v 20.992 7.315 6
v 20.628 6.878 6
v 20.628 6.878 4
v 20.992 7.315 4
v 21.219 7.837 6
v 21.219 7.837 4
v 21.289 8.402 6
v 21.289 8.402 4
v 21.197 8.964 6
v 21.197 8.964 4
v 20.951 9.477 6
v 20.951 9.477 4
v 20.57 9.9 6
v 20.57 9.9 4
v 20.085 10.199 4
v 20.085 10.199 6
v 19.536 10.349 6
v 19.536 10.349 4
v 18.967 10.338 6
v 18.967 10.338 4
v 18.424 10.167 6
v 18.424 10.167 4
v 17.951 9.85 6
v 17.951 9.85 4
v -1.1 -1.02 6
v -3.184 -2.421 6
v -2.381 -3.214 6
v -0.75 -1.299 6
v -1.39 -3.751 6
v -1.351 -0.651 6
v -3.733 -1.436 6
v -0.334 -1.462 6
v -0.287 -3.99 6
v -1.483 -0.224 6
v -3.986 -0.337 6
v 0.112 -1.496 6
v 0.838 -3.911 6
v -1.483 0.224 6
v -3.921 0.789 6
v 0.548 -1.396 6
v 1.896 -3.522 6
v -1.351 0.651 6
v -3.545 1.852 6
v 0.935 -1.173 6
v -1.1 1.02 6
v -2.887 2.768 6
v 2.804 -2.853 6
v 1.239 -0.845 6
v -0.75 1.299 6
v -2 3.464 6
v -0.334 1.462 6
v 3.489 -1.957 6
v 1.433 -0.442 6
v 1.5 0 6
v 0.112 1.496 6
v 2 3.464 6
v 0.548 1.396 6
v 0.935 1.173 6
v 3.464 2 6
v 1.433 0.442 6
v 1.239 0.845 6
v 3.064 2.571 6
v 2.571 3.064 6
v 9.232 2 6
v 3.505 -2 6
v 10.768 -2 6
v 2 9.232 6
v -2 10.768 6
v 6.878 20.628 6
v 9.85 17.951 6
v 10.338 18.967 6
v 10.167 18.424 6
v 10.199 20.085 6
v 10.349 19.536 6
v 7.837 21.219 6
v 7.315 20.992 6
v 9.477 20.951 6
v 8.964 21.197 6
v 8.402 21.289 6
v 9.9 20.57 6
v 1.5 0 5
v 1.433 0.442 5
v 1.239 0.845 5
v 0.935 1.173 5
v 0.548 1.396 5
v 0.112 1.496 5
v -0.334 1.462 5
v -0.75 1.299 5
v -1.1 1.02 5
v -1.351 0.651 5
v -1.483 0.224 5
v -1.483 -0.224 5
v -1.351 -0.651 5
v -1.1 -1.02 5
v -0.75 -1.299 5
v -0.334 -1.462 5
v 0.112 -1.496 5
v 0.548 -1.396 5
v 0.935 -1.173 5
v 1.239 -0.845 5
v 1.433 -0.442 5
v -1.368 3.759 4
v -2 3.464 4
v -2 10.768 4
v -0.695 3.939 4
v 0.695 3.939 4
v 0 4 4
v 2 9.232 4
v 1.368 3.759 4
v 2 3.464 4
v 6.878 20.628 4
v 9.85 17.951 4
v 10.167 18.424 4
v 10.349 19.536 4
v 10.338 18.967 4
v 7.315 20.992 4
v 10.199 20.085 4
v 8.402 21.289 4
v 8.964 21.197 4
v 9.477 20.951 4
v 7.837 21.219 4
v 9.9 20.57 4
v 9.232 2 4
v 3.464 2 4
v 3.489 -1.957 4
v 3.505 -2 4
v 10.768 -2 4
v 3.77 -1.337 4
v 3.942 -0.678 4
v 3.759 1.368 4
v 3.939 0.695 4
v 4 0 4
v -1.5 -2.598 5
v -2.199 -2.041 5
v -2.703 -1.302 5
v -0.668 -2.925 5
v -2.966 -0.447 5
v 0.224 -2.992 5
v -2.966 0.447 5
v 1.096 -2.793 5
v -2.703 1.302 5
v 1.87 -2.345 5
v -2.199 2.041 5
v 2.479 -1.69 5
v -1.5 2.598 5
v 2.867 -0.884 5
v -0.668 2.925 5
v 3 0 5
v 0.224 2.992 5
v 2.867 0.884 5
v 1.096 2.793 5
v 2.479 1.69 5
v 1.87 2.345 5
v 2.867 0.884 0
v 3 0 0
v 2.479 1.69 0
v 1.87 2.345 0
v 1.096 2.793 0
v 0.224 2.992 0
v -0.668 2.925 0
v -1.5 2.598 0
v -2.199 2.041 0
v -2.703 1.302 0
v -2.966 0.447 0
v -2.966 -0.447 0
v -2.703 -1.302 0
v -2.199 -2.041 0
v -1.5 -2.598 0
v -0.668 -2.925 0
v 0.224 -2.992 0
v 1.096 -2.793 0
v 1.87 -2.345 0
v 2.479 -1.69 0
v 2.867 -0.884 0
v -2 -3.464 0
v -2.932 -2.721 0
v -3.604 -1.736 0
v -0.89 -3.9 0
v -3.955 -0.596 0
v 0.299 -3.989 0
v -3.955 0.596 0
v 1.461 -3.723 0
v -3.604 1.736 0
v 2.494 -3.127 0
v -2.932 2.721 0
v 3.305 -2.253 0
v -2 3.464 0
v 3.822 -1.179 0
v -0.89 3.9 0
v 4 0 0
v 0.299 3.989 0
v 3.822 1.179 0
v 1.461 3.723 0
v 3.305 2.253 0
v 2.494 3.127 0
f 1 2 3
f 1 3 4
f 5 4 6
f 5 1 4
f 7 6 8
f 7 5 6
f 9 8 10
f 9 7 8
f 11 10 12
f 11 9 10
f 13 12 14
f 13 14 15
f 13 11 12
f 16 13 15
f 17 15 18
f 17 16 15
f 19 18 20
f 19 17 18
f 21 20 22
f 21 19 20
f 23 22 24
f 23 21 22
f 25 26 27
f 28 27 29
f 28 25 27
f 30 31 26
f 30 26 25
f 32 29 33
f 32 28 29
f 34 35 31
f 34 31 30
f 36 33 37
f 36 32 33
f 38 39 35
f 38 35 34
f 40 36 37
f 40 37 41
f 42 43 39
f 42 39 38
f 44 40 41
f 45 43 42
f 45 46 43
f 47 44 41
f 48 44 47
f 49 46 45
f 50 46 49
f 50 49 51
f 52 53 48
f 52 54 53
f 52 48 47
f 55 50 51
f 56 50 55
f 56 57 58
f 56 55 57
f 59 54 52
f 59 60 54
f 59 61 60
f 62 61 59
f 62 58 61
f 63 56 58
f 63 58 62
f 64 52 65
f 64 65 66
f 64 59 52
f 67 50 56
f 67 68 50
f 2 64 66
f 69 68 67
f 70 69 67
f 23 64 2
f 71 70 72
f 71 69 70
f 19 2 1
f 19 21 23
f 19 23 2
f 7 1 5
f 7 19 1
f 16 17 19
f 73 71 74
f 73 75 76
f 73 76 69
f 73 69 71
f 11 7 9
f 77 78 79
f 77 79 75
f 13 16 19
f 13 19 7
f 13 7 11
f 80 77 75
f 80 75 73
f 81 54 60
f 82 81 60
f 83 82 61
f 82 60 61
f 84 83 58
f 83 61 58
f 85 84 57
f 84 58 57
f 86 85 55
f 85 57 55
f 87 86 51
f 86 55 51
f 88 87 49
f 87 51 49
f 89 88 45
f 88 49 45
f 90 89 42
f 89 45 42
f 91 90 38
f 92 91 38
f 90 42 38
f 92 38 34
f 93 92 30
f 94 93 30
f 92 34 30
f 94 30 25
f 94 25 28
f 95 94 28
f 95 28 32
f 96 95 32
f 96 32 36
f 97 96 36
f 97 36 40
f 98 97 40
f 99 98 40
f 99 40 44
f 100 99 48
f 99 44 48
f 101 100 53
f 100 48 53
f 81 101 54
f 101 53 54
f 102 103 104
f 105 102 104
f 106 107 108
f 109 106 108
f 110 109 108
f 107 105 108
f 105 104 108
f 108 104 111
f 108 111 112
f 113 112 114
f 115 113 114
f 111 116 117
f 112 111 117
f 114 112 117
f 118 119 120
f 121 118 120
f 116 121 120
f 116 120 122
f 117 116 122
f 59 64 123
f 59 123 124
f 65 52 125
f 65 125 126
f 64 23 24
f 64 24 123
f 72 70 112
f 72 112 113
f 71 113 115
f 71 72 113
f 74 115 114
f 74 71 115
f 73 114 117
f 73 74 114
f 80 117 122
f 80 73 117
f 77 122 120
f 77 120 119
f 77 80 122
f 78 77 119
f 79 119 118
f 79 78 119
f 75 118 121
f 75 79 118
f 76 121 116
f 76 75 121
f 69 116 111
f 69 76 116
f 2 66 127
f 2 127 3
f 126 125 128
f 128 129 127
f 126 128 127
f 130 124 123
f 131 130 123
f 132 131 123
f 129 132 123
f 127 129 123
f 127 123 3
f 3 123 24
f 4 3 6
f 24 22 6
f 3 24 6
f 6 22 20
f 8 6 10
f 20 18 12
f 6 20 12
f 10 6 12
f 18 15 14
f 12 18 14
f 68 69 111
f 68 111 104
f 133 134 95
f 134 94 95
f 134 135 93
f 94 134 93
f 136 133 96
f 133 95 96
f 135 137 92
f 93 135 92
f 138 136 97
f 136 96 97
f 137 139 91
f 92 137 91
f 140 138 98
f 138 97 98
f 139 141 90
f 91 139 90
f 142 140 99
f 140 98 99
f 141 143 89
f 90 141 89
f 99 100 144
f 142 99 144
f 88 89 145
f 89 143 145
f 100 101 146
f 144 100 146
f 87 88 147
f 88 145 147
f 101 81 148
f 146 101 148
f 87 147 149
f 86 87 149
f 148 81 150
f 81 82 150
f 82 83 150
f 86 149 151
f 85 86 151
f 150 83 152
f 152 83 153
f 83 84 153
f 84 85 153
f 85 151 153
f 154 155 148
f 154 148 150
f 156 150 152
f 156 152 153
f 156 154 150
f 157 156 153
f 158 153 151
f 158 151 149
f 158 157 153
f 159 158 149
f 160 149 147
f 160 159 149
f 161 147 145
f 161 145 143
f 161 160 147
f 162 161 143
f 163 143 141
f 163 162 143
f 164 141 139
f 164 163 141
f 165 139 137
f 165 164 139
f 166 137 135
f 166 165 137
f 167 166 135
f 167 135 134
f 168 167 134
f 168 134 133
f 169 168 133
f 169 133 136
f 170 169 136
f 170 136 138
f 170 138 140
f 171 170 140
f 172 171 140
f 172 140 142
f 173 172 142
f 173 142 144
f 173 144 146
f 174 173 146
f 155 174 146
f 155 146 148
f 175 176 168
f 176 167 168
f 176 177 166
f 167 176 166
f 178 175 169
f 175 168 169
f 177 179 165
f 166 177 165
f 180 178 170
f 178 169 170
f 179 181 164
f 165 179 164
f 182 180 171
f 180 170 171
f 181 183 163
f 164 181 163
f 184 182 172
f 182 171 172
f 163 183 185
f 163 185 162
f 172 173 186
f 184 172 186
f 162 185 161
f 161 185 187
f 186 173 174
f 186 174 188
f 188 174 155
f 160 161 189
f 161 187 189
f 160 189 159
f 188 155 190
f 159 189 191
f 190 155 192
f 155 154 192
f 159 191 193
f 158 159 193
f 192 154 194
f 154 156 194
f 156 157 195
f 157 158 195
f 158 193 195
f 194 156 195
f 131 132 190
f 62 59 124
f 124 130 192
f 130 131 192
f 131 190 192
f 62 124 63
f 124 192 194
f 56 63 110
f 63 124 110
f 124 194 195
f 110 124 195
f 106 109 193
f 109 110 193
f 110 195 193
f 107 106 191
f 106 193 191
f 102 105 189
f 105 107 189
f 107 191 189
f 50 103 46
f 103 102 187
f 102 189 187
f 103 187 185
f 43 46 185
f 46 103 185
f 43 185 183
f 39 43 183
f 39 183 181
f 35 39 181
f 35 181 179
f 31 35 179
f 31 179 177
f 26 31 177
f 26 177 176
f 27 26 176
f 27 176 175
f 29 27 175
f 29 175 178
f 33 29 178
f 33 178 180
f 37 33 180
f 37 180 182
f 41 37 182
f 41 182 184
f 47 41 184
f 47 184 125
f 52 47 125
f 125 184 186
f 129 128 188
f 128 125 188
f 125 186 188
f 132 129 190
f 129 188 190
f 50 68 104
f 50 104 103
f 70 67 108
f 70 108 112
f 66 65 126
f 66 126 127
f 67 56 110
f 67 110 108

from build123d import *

# Parameters (mm, degrees)
ESQUISSE4_R        = 4
ESQUISSE4_R_2      = 3
BOSS_EXTRU_1_DEPTH = 6
ESQUISSE6_R        = 3
ESQUISSE6_R_2      = 1.5
BOSS_EXTRU_2_DEPTH = 1
BOSS_EXTRU_3_DEPTH = 2


with BuildPart() as part:
    # Esquisse4 → Boss.-Extru.1 (new body)
    with BuildSketch(Plane.XY):
        Circle(ESQUISSE4_R)
        Circle(ESQUISSE4_R_2, mode=Mode.SUBTRACT)
    extrude(amount=BOSS_EXTRU_1_DEPTH)

    # Esquisse6 → Boss.-Extru.2 (add)
    with BuildSketch(Plane.XY.offset(6)):
        Circle(ESQUISSE6_R)
        Circle(ESQUISSE6_R_2, mode=Mode.SUBTRACT)
    extrude(amount=-BOSS_EXTRU_2_DEPTH)

    # Esquisse7 → Boss.-Extru.3 (add)
    with BuildSketch(Plane.XY.offset(6)):
        with BuildLine():
            ThreePointArc((3.464101615, 2), (3.863703305, 1.03527618), (4, 0))
            ThreePointArc((4, 0), (3.870082468, -1.011168479), (3.488769153, -1.956652702))
            Line((3.488769153, -1.956652702), (3.505079435, -2))
            Line((3.505079435, -2), (10.76772807, -2))
            Line((10.76772807, -2), (20.627571531, 6.877842929))
            ThreePointArc((20.627571531, 6.877842929), (20.775599969, 9.702393792), (17.951049106, 9.85042223))
            Line((17.951049106, 9.85042223), (9.23227193, 2))
            Line((9.23227193, 2), (3.464101615, 2))
        make_face()
        with BuildLine():
            ThreePointArc((0, 4), (1.03527618, 3.863703305), (2, 3.464101615))
            Line((2, 3.464101615), (2, 9.23227193))
            Line((2, 9.23227193), (9.85042223, 17.951049106))
            ThreePointArc((9.85042223, 17.951049106), (9.702393792, 20.775599969), (6.877842929, 20.627571531))
            Line((6.877842929, 20.627571531), (-2, 10.76772807))
            Line((-2, 10.76772807), (-2, 3.464101615))
            ThreePointArc((-2, 3.464101615), (-1.03527618, 3.863703305), (0, 4))
        make_face()
    extrude(amount=-BOSS_EXTRU_3_DEPTH)


solid = part.part
